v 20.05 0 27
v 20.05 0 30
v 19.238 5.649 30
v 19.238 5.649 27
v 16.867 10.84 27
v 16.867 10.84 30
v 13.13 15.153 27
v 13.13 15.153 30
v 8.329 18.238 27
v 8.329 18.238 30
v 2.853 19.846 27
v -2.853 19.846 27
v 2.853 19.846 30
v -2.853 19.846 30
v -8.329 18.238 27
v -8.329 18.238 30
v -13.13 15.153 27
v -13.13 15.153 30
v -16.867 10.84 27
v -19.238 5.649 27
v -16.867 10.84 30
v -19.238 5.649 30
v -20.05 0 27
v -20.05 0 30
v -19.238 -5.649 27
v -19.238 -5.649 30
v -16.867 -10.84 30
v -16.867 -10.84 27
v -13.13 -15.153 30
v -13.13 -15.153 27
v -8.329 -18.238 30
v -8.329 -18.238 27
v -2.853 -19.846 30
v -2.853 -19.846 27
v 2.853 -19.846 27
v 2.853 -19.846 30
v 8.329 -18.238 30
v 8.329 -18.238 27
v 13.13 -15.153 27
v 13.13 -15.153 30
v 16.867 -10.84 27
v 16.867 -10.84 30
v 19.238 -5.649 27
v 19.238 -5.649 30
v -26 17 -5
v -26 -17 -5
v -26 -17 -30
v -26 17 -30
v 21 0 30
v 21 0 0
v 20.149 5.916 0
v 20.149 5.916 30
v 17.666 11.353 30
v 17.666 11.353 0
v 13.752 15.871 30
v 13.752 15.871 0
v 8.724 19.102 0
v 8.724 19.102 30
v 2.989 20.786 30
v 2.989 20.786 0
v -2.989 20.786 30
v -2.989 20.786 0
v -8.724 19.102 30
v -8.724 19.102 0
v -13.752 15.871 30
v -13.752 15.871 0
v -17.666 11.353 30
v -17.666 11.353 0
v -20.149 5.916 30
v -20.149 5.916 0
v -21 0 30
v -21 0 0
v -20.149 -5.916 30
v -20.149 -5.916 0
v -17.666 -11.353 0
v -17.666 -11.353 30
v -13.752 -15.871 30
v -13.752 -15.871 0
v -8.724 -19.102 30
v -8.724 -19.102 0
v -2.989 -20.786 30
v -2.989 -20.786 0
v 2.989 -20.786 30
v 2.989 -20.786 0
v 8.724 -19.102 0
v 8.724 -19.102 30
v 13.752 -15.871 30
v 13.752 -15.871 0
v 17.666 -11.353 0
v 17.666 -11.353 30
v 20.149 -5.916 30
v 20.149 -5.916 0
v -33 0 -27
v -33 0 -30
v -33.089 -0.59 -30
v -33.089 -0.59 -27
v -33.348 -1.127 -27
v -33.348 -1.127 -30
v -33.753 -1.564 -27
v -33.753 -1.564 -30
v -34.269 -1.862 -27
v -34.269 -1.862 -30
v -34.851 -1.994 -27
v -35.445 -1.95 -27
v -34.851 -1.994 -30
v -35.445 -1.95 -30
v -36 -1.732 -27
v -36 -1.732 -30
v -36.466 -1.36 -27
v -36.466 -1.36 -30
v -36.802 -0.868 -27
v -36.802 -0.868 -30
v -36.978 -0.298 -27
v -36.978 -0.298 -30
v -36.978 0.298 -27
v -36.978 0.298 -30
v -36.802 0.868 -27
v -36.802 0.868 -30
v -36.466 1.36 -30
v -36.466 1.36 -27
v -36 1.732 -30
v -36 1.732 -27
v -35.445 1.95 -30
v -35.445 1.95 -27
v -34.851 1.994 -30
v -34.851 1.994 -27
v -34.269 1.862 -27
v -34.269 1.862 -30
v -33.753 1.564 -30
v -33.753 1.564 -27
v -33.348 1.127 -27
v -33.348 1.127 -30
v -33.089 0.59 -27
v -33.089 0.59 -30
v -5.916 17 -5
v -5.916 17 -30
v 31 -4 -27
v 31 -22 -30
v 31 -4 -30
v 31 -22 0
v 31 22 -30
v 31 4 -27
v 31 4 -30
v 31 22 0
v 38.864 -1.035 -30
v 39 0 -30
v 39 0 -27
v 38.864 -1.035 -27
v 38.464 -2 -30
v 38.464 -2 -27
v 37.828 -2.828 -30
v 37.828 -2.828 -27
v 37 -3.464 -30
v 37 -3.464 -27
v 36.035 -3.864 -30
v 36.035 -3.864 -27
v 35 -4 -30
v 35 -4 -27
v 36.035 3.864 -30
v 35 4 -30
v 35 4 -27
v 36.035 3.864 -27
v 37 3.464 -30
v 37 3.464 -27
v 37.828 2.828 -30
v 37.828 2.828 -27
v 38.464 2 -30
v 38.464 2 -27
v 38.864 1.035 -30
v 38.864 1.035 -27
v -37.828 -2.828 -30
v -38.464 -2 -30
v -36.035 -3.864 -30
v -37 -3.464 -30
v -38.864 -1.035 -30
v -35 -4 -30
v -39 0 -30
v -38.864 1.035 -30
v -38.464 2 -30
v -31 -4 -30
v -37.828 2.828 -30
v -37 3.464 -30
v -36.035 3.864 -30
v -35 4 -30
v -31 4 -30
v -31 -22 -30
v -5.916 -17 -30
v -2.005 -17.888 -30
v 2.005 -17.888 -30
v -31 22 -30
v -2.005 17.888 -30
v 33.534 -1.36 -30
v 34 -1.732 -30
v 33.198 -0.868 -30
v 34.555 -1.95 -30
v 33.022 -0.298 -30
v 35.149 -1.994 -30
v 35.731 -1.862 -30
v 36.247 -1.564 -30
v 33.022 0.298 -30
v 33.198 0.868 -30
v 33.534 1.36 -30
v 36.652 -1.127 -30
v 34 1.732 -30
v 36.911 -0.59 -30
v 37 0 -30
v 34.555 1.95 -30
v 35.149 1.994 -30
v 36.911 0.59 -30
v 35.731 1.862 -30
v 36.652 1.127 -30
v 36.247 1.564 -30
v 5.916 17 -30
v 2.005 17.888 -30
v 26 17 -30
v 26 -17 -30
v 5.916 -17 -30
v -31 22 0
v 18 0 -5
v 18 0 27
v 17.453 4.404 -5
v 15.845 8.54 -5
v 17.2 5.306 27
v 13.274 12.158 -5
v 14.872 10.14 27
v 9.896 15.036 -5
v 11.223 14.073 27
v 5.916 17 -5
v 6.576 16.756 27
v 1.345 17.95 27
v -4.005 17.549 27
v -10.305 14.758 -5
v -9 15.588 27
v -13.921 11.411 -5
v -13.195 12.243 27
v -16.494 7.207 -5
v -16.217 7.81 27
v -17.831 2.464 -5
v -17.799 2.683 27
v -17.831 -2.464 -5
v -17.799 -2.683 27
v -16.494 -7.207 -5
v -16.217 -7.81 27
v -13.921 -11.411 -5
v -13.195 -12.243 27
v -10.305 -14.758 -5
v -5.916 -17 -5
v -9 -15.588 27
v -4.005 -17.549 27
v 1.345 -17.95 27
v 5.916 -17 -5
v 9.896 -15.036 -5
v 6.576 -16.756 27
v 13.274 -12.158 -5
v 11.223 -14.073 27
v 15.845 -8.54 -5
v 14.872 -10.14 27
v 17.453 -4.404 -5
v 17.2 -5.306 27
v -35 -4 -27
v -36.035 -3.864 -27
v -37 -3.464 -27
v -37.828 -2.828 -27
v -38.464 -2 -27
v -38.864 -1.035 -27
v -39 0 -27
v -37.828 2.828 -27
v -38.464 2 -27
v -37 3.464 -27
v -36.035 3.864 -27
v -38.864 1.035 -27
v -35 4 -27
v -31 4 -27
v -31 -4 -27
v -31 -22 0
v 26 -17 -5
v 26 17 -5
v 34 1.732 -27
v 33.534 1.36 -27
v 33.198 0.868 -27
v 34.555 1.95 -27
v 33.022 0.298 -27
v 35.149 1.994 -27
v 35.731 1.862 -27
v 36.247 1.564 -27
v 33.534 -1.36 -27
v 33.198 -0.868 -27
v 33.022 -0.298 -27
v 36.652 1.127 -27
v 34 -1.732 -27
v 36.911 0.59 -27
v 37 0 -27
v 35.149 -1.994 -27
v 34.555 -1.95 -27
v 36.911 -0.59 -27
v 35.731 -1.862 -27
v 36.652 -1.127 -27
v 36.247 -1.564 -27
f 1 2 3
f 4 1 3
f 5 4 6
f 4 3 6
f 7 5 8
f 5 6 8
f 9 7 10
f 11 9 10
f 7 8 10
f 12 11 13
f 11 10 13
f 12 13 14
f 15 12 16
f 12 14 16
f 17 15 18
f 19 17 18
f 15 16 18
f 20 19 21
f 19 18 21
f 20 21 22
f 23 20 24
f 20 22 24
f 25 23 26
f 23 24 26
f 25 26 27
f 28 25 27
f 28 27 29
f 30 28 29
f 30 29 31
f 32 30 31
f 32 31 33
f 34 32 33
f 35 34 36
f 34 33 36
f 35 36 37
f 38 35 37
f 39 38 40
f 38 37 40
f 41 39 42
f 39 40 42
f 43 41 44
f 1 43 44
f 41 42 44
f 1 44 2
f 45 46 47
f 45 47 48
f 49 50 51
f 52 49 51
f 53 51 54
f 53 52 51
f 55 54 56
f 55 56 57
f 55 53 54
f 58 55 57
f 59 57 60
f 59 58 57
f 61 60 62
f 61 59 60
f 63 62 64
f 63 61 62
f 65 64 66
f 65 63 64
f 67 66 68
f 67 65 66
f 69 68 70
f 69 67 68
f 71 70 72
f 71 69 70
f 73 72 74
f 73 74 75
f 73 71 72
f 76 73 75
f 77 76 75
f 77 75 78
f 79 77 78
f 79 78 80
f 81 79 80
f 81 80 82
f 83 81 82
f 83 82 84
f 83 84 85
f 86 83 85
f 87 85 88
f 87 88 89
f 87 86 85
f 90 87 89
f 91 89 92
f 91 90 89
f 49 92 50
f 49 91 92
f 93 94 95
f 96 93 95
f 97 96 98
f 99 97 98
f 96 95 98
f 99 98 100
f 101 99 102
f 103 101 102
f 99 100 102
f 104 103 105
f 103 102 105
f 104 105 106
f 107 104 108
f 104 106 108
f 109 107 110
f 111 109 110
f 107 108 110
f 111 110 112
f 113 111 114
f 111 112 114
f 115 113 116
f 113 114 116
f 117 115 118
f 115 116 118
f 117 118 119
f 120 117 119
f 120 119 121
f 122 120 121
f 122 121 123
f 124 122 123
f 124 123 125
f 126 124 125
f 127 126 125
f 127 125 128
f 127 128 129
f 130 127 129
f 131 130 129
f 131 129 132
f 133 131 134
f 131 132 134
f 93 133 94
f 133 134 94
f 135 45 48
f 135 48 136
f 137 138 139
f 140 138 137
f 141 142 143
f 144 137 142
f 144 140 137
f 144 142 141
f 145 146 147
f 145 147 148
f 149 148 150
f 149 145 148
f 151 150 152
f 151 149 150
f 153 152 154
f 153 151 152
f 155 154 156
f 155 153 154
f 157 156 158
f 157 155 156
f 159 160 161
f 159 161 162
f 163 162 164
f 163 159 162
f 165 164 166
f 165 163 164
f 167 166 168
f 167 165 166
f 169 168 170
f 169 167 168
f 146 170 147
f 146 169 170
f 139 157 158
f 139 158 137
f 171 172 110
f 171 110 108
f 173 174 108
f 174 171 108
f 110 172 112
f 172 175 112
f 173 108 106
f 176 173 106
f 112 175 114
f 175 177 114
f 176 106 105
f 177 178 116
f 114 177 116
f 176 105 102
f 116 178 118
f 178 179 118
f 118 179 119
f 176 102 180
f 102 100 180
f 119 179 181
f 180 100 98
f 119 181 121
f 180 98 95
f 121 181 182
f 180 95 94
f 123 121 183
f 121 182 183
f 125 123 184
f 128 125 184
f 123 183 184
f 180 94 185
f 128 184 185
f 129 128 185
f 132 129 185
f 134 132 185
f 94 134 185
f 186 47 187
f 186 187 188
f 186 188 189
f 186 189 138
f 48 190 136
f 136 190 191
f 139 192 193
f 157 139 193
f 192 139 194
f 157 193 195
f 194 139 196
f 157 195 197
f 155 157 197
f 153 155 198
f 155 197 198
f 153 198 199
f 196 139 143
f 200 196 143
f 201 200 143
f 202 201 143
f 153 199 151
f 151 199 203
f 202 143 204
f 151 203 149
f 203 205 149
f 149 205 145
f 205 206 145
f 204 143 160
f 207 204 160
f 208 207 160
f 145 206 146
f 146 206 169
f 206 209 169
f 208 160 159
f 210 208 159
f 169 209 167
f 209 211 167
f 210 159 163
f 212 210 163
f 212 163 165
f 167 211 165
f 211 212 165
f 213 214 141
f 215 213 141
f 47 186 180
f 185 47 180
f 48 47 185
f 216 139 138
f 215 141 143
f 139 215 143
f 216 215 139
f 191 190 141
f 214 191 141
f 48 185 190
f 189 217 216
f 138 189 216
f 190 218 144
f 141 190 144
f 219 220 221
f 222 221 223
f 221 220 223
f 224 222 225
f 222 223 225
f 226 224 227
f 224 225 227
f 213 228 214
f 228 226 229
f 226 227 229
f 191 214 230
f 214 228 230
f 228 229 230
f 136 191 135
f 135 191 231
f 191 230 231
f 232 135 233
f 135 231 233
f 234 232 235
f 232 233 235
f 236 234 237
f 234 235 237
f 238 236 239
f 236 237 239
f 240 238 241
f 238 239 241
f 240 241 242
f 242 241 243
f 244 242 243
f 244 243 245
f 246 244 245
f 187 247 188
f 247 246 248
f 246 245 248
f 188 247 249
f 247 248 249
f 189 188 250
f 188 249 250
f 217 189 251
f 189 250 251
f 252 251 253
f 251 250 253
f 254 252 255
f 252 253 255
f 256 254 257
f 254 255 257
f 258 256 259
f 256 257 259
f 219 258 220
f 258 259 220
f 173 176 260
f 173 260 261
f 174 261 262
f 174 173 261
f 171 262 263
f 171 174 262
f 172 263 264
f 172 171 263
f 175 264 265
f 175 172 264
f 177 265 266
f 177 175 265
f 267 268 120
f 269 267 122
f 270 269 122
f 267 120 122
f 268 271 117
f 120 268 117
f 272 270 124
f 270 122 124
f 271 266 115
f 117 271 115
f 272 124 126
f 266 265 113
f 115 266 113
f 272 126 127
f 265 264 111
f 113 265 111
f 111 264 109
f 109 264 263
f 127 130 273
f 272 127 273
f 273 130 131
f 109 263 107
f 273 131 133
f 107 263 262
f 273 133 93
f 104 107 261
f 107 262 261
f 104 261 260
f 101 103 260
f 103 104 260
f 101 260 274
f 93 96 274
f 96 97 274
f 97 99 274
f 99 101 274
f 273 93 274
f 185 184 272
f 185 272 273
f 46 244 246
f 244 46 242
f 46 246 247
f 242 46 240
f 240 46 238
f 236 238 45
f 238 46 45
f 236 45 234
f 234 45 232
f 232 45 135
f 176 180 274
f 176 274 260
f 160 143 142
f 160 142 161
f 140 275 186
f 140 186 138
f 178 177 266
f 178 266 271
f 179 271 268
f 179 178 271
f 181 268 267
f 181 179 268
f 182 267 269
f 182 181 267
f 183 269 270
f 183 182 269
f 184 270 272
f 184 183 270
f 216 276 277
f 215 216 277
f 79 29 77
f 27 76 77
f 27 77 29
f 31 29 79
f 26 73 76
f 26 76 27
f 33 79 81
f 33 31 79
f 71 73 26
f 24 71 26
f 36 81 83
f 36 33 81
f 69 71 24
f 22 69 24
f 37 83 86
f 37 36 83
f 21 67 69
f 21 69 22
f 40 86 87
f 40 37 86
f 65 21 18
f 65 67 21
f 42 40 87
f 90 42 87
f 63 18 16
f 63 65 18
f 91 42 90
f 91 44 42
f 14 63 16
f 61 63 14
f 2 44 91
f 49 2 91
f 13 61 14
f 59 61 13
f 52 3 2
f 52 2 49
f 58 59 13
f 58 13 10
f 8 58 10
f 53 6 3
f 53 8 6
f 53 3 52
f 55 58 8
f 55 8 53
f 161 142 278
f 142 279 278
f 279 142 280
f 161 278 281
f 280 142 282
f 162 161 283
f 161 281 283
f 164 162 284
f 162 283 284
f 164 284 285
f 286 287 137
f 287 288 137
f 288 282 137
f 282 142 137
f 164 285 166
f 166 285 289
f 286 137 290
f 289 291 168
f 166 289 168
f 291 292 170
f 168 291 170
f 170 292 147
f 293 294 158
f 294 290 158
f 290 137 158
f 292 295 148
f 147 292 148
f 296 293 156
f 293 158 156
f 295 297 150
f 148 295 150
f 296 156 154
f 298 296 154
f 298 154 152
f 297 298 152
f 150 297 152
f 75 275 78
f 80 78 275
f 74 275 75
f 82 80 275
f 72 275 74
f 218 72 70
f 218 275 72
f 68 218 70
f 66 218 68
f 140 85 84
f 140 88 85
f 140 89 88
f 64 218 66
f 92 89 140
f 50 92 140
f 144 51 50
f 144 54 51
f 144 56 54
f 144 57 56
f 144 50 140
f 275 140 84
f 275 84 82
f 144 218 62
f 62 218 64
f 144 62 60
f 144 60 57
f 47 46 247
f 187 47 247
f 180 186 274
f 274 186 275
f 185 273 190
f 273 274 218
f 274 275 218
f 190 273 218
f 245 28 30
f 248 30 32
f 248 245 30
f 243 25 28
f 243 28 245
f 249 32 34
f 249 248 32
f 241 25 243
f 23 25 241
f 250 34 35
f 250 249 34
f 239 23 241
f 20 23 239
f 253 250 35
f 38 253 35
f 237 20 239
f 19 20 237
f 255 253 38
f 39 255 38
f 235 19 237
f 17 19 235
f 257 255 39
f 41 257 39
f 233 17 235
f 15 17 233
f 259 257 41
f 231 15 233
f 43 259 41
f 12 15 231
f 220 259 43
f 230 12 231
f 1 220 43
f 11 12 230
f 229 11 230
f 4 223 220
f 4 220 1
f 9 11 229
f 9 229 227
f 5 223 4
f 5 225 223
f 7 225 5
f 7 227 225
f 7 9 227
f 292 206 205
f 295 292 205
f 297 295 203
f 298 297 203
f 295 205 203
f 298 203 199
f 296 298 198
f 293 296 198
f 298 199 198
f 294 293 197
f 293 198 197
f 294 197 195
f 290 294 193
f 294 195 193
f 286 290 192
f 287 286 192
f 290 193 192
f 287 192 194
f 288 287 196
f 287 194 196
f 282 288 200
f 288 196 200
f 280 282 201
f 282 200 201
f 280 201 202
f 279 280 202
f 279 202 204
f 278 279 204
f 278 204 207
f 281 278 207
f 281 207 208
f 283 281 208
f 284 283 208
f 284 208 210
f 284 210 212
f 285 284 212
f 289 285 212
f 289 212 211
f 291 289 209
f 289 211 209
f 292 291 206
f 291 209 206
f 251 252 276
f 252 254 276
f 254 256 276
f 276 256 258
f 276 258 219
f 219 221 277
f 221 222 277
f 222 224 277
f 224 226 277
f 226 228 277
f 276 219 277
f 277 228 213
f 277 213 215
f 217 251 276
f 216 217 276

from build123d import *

# Parameters (mm, degrees)
F0_W          = 62
F0_H          = 44
F1_DEPTH      = 30
F1_DEPTH_BACK = 30
F2_W          = 62
F2_H          = 44
F2_R          = 21
F2_R_2        = 18
F3_DEPTH      = 30
F4_T          = 5
F5_R          = 2
F6_DEPTH      = 3
F7_R          = 9.05
F8_DEPTH      = 1.5
F9_R          = 18
F10_DEPTH     = 30.001
F11_R         = 20.05
F12_DEPTH     = 3


# Not quite as in the source:
# - a shell that OpenCascade refuses in one call is made with other operations: the cavity is built on its own and cut out


with BuildPart() as f1:
    # F0 (on Top) → F1 (new body, two sides)
    with BuildSketch(Plane.XY) as f1_sk:
        Rectangle(F0_W, F0_H)
    extrude(amount=F1_DEPTH)
    extrude(f1_sk.sketch, amount=-F1_DEPTH_BACK)

    # F2 (on face) → F3 (cut)
    with BuildSketch(Plane.XY.offset(30)):
        Rectangle(F2_W, F2_H)
        Circle(F2_R, mode=Mode.SUBTRACT)
        Circle(F2_R_2)
    extrude(amount=-F3_DEPTH, mode=Mode.SUBTRACT)

    # F4: shell of thickness 5, made by hand


with BuildPart() as f4_core1:
    # F4_t2: copy of F1
    add(f1.part)

    # the walls: a layer under each face that stays
    f4_faces = [f4_core1.faces().sort_by_distance(p)[0] for p in [
        (0, 22, -15),
        (31, 0, -15),
        (-31, 0, -15),
        (-20.6666666667, -14.6666666667, 0),
        (0, -22, -15),
        (-21, 0, 15),
        (-14, -14, 30),
        (-18, 0, 15),
        (0, 0, 0),
    ]]
    thicken(f4_faces, amount=-F4_T, mode=Mode.SUBTRACT)

    # F4_s3 → F4_t4 (revolve, cut)
    with BuildSketch(Plane.XZ):
        Polygon((21.05, 0.05), (21, -5), (16, -5), (16, 0), align=None)
    revolve(axis=Axis((0, 0, 0), (0, 0, 1)), mode=Mode.SUBTRACT)

    # F4_s5 → F4_t6 (revolve, cut)
    with BuildSketch(Plane.XZ):
        Polygon((17.95, 0.05), (23, 0), (23, -5), (18, -5), align=None)
    revolve(axis=Axis((0, 0, 0), (0, 0, 1)), mode=Mode.SUBTRACT)


with BuildPart() as f1_1:
    add(f1.part)

    # what is left inside the walls is the cavity
    f4_cavity = [f4_core1.part.solids().sort_by_distance(p)[0] for p in [
        (0, -5.666667, -29.95),
    ]]
    add(f4_cavity, mode=Mode.SUBTRACT)

    # F5 (on face) → F6 (join)
    with BuildSketch(Plane(origin=(0, 0, -30), x_dir=(1, 0, 0), z_dir=(0, 0, -1))):
        with BuildLine():
            Line((35, 4), (31, 4))
            Line((31, 4), (31, -4))
            Line((31, -4), (35, -4))
            ThreePointArc((35, -4), (37.8284271247, -2.8284271247), (39, 0))
            ThreePointArc((39, 0), (37.8284271247, 2.8284271247), (35, 4))
        make_face()
        with Locations((35, 0)):
            Circle(F5_R, mode=Mode.SUBTRACT)
        with BuildLine():
            ThreePointArc((-39, 0), (-37.8284271247, -2.8284271247), (-35, -4))
            Line((-35, -4), (-31, -4))
            Line((-31, -4), (-31, 4))
            Line((-31, 4), (-35, 4))
            ThreePointArc((-35, 4), (-37.8284271247, 2.8284271247), (-39, 0))
        make_face()
        with Locations((-35, 0)):
            Circle(F5_R, mode=Mode.SUBTRACT)
    extrude(amount=-F6_DEPTH)

    # F7 (on face) → F8 (cut)
    with BuildSketch(Plane.XY.offset(30)):
        Circle(F7_R)
    extrude(amount=-F8_DEPTH, mode=Mode.SUBTRACT)

    # F9 (on face) → F10 (cut, through all)
    with BuildSketch(Plane.XY):
        Circle(F9_R)
    extrude(amount=-F10_DEPTH, mode=Mode.SUBTRACT)

    # F11 (on face) → F12 (cut)
    with BuildSketch(Plane.XY.offset(30)):
        Circle(F11_R)
    extrude(amount=-F12_DEPTH, mode=Mode.SUBTRACT)


solid = f1_1.part
